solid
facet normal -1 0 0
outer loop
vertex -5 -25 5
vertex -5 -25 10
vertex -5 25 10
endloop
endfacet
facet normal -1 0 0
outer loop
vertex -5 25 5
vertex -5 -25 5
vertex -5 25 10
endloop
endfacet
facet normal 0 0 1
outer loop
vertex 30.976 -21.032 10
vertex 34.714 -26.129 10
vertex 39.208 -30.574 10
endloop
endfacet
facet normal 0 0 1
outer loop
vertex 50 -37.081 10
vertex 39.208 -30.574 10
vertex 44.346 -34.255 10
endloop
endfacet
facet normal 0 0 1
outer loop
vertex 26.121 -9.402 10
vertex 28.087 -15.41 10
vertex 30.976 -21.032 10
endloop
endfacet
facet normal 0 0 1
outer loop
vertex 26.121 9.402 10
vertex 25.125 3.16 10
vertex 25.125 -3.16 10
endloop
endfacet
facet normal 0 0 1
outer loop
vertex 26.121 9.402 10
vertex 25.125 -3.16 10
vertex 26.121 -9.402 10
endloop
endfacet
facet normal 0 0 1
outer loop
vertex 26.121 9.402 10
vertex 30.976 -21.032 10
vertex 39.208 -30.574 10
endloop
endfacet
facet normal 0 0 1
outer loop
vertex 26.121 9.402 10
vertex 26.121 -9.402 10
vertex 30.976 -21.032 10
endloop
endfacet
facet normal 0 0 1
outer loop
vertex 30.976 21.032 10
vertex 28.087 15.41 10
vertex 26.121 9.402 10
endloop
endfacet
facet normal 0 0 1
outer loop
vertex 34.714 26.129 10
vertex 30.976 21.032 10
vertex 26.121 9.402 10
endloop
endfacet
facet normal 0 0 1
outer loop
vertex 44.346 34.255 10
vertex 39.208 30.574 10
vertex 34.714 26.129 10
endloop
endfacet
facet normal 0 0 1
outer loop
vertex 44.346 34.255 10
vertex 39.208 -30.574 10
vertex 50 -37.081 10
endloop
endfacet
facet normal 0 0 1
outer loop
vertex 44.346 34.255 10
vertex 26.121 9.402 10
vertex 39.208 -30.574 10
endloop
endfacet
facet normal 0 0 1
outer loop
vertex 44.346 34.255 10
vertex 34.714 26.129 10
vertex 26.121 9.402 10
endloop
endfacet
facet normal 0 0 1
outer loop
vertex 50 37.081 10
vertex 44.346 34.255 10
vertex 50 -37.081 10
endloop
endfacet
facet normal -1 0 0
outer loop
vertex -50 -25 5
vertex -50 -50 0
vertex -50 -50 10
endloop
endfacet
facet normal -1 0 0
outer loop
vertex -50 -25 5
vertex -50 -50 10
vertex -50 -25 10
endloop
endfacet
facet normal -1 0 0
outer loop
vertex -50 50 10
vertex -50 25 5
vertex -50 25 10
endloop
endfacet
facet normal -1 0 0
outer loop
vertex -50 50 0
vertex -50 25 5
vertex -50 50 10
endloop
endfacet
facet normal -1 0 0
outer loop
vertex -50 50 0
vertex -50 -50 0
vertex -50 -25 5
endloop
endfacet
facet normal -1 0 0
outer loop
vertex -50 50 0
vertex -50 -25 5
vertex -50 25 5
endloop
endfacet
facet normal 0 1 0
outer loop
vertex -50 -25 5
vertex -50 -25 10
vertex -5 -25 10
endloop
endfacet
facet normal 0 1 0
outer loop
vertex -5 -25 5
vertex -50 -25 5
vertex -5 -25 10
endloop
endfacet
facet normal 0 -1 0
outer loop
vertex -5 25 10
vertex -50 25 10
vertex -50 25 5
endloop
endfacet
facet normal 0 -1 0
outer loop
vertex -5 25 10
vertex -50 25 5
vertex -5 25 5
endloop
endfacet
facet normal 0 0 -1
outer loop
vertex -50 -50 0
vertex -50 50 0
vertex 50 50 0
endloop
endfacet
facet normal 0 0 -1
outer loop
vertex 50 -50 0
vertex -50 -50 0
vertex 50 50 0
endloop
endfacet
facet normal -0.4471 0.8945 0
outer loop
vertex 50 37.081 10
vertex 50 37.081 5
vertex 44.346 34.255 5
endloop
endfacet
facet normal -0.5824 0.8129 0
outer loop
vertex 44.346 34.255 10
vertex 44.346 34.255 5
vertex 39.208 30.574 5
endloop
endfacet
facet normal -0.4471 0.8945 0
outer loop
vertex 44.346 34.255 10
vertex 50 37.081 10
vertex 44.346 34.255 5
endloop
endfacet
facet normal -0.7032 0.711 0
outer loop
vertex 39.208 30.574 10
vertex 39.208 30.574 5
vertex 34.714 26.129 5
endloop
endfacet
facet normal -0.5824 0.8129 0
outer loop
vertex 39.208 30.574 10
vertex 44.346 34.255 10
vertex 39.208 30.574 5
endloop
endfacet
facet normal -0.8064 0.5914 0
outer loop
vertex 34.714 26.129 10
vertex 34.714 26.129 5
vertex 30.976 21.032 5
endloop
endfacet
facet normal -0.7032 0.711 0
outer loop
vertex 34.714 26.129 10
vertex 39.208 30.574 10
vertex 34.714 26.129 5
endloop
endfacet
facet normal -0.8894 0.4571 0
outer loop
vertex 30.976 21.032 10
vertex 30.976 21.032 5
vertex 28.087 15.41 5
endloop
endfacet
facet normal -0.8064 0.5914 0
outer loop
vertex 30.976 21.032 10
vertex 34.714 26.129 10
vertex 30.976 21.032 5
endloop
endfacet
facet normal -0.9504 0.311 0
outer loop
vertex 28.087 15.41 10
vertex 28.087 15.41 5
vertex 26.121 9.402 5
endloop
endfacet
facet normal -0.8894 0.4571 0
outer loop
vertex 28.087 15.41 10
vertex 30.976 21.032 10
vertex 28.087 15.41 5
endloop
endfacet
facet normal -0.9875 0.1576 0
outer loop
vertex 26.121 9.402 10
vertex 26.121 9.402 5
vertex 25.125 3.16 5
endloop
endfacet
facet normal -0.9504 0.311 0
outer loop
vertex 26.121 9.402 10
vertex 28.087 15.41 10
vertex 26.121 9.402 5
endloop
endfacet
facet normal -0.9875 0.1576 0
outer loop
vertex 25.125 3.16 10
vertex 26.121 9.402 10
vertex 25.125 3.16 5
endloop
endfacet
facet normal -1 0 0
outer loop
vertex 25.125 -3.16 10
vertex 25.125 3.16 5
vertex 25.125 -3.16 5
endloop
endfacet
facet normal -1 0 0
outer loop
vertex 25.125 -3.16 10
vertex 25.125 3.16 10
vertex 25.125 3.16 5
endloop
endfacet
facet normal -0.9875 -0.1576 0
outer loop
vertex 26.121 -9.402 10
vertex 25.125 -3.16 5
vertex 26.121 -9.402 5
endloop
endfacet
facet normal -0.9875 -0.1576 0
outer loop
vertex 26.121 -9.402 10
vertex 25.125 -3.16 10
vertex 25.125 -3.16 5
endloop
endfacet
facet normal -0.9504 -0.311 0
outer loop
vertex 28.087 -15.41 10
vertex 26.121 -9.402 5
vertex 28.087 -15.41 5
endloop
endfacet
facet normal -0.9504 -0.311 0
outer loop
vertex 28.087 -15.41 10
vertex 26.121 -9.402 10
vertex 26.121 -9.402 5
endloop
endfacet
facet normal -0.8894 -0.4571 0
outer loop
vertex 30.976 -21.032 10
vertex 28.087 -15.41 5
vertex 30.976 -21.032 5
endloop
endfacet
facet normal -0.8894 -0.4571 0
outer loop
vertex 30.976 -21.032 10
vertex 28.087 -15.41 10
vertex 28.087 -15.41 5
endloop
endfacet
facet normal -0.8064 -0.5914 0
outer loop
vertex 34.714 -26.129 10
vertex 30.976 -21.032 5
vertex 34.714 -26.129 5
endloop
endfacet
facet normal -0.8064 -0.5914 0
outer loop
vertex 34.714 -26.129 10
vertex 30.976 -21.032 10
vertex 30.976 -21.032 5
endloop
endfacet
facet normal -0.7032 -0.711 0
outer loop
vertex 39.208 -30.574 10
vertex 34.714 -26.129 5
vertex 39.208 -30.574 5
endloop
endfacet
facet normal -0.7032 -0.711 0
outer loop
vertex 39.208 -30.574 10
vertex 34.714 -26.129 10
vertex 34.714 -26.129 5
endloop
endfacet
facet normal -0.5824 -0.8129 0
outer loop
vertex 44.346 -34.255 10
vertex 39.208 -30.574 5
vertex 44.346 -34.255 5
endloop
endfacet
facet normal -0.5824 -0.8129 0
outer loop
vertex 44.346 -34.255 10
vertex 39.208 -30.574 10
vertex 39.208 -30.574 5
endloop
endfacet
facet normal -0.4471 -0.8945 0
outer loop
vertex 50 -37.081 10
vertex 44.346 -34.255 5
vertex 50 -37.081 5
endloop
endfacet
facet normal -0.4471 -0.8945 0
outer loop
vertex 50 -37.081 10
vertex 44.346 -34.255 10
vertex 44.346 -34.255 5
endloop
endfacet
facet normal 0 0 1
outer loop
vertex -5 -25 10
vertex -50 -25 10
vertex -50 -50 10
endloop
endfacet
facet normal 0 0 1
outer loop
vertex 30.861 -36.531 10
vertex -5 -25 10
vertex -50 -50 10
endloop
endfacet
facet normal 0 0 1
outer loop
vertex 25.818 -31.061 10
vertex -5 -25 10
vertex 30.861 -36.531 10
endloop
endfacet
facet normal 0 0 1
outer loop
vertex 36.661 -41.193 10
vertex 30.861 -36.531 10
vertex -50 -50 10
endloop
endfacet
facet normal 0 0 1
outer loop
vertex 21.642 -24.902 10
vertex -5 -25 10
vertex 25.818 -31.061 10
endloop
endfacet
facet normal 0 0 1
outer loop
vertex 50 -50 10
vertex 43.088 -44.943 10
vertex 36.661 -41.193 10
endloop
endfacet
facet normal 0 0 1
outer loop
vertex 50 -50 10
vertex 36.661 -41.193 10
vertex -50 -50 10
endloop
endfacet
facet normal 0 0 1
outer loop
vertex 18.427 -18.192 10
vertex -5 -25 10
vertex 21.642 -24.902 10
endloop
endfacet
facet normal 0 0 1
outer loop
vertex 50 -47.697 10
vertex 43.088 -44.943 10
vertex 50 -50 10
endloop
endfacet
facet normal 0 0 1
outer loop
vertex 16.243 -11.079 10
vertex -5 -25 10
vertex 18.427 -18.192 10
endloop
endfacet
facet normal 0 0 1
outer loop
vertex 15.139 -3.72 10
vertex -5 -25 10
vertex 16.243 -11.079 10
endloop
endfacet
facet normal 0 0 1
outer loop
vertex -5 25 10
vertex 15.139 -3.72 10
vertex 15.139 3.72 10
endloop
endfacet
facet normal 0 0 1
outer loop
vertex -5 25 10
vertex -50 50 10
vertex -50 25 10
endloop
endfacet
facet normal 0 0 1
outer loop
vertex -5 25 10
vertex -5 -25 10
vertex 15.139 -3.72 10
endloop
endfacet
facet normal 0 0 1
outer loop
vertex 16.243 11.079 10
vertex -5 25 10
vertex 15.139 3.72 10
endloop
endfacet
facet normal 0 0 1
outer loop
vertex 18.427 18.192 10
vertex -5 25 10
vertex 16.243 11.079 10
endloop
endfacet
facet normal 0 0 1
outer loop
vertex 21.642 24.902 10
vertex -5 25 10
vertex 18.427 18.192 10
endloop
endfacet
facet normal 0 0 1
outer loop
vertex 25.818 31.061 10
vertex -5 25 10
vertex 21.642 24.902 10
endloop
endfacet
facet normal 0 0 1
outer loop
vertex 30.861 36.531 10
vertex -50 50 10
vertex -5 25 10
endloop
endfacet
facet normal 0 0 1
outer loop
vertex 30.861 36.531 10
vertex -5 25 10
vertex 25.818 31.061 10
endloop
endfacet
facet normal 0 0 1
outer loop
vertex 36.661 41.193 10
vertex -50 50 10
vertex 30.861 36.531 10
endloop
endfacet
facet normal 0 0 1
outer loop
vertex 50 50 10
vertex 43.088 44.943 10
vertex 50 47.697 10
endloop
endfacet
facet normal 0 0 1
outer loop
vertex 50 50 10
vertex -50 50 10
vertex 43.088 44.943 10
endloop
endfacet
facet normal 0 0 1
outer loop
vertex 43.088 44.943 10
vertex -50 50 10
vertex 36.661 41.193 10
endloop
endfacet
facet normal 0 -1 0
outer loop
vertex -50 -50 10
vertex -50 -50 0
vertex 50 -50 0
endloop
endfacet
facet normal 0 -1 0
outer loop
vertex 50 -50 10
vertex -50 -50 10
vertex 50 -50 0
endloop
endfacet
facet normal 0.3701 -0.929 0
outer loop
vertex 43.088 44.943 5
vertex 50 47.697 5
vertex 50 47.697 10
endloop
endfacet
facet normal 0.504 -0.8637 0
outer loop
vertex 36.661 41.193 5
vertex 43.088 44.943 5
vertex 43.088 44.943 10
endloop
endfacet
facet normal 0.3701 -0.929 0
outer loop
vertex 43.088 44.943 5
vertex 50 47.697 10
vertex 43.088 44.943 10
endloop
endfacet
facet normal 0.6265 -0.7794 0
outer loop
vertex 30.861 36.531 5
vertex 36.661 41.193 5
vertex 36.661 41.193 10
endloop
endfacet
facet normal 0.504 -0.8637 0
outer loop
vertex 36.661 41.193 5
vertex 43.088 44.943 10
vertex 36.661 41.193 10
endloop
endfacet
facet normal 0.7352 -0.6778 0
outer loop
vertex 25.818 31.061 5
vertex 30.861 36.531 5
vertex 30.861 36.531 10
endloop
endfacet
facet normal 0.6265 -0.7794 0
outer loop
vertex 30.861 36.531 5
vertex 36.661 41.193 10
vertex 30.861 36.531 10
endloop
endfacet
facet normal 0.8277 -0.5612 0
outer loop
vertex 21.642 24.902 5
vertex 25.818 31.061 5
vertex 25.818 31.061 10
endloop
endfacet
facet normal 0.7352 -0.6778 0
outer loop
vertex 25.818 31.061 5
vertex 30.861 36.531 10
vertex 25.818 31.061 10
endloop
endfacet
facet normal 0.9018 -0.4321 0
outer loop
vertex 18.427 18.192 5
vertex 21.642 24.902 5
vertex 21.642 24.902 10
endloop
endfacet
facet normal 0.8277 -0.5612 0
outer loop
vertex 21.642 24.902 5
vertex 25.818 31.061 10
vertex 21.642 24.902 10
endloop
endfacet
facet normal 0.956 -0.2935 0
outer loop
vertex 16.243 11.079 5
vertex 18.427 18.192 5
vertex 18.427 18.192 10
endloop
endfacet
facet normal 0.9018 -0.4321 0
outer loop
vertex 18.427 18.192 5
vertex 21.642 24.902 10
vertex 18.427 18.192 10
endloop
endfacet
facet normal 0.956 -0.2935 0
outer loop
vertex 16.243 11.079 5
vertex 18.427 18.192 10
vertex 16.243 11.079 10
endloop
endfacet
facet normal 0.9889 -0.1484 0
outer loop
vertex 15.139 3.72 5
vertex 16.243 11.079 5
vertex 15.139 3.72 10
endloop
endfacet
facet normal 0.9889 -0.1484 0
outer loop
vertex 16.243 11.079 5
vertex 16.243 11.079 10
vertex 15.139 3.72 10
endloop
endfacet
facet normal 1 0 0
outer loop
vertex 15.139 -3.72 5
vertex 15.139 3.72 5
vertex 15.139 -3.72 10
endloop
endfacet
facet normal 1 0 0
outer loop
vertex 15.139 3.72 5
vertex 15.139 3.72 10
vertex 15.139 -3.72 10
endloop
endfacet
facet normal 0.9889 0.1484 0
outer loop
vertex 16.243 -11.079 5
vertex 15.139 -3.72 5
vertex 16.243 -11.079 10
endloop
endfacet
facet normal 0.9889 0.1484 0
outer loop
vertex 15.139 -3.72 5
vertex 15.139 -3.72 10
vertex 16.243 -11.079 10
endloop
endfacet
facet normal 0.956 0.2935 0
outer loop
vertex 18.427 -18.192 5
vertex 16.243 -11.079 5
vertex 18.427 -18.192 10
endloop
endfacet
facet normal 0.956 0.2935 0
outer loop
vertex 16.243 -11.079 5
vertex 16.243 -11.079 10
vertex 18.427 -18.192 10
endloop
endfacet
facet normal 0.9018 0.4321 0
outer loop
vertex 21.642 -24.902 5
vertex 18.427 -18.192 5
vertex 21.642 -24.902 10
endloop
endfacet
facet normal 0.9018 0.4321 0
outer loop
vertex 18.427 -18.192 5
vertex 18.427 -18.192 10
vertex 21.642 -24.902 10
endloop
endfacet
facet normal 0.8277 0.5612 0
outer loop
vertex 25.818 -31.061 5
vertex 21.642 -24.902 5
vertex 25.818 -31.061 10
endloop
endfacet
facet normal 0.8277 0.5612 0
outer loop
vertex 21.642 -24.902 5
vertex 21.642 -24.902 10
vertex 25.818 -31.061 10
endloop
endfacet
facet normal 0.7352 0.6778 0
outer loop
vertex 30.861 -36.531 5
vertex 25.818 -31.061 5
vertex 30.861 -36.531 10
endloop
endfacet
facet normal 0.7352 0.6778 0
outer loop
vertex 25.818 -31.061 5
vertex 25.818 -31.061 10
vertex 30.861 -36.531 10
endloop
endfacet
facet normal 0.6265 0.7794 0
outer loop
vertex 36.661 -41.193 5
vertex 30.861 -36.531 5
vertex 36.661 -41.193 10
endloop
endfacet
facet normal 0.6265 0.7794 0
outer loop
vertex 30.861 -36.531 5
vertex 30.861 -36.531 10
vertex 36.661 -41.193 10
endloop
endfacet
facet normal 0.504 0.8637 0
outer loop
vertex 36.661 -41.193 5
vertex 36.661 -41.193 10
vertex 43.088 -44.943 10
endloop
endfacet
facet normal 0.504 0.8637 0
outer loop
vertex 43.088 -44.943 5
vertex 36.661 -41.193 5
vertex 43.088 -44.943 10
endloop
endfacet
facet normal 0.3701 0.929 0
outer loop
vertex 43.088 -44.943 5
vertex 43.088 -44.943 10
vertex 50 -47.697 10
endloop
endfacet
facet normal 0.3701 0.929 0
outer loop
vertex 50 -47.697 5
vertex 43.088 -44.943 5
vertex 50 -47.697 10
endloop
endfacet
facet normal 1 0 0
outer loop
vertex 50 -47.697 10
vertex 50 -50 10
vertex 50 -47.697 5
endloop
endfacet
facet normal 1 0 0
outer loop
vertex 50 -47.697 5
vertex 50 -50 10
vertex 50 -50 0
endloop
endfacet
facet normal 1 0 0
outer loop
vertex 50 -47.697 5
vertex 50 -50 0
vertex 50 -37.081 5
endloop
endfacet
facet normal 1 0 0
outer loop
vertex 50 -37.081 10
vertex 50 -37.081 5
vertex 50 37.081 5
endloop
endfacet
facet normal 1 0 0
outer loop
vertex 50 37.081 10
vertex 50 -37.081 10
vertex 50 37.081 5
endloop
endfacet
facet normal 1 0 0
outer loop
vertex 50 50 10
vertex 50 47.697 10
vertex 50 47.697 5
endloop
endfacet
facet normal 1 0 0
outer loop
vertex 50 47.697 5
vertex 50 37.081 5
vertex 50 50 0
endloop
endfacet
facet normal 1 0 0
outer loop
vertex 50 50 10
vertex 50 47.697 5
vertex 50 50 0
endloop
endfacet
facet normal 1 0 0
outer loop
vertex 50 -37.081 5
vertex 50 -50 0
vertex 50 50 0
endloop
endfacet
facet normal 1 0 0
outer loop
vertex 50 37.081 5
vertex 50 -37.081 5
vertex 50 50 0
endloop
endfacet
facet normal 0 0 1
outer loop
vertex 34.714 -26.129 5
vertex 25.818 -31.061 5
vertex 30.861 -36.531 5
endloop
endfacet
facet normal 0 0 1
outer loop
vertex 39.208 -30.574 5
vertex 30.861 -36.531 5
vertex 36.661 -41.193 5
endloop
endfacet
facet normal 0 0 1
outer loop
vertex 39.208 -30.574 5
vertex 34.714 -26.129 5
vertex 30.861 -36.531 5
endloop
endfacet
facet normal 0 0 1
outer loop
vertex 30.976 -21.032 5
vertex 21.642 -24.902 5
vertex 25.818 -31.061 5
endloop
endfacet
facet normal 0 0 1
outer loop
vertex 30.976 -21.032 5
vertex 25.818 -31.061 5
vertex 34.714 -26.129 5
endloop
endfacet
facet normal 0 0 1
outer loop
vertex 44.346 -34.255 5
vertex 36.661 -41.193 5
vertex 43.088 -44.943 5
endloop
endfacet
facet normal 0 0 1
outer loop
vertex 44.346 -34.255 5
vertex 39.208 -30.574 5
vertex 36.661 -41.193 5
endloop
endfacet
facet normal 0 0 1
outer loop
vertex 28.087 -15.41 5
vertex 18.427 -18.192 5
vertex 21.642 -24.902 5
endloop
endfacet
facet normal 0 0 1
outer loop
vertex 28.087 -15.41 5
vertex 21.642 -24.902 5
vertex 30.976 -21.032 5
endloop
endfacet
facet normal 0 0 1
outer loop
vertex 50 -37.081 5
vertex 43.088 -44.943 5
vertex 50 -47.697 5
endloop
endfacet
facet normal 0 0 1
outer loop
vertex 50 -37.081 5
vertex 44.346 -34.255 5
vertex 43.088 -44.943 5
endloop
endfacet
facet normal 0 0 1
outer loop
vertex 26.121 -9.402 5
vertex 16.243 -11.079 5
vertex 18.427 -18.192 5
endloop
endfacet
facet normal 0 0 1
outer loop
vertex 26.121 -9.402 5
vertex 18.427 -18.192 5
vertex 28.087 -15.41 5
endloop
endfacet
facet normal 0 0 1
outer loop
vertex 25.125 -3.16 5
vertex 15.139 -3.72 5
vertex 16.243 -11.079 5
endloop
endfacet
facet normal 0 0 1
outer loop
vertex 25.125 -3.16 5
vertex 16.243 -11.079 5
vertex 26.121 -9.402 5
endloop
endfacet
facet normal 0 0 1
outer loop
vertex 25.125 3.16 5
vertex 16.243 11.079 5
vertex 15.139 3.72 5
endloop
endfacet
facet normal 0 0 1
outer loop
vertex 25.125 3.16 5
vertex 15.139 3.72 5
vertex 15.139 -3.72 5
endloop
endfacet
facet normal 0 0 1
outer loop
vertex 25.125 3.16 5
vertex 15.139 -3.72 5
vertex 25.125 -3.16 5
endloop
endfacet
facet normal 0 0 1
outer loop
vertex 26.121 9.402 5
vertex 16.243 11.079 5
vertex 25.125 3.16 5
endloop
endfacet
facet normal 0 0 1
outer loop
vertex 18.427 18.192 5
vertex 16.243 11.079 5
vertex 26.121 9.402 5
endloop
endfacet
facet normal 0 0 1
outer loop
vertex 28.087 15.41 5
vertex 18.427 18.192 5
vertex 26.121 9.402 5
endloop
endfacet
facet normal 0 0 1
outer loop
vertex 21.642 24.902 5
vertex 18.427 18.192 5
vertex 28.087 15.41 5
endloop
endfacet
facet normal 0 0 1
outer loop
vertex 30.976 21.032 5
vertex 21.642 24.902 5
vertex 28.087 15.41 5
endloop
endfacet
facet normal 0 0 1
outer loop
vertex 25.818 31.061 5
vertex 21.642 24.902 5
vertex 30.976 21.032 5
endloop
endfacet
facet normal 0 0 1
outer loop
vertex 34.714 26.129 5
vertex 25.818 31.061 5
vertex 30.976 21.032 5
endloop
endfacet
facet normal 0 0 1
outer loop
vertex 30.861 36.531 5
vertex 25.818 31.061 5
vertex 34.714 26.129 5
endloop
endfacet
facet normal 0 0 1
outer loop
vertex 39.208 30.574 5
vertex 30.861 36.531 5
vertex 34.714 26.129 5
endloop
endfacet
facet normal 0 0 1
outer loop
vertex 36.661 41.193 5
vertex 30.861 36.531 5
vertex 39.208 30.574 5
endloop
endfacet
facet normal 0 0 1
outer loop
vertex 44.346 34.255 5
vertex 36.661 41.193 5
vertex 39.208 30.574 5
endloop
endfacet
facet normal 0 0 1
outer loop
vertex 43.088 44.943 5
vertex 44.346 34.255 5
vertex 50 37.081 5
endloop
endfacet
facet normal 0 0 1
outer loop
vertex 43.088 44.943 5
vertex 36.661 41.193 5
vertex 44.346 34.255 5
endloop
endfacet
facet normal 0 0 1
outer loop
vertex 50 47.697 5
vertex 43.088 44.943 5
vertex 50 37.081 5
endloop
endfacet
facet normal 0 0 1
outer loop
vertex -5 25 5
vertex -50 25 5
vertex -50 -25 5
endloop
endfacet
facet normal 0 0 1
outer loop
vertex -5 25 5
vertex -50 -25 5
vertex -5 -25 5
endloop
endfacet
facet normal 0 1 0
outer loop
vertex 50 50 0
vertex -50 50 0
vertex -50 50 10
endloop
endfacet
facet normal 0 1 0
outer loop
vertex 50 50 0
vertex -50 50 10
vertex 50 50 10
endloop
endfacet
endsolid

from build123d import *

# Parameters (mm, degrees)
SKETCH_W      = 100
SKETCH_H      = 100
PAD_DEPTH     = 10
SKETCH001_R   = 50
SKETCH001_R_2 = 40
SKETCH001_W   = 50
SKETCH001_H   = 50
POCKET_DEPTH  = 5


with BuildPart() as part:
    # Sketch → Pad (new body)
    with BuildSketch(Plane.XY):
        Rectangle(SKETCH_W, SKETCH_H)
    extrude(amount=PAD_DEPTH)

    # Sketch001 (on Face6 of Pad) → Pocket (cut)
    with BuildSketch(Plane.XY.offset(10)):
        with Locations((65, 0)):
            Circle(SKETCH001_R)
        with Locations((65, 0)):
            Circle(SKETCH001_R_2, mode=Mode.SUBTRACT)
        with Locations((-30, 0)):
            Rectangle(SKETCH001_W, SKETCH001_H)
    extrude(amount=-POCKET_DEPTH, mode=Mode.SUBTRACT)


solid = part.part
